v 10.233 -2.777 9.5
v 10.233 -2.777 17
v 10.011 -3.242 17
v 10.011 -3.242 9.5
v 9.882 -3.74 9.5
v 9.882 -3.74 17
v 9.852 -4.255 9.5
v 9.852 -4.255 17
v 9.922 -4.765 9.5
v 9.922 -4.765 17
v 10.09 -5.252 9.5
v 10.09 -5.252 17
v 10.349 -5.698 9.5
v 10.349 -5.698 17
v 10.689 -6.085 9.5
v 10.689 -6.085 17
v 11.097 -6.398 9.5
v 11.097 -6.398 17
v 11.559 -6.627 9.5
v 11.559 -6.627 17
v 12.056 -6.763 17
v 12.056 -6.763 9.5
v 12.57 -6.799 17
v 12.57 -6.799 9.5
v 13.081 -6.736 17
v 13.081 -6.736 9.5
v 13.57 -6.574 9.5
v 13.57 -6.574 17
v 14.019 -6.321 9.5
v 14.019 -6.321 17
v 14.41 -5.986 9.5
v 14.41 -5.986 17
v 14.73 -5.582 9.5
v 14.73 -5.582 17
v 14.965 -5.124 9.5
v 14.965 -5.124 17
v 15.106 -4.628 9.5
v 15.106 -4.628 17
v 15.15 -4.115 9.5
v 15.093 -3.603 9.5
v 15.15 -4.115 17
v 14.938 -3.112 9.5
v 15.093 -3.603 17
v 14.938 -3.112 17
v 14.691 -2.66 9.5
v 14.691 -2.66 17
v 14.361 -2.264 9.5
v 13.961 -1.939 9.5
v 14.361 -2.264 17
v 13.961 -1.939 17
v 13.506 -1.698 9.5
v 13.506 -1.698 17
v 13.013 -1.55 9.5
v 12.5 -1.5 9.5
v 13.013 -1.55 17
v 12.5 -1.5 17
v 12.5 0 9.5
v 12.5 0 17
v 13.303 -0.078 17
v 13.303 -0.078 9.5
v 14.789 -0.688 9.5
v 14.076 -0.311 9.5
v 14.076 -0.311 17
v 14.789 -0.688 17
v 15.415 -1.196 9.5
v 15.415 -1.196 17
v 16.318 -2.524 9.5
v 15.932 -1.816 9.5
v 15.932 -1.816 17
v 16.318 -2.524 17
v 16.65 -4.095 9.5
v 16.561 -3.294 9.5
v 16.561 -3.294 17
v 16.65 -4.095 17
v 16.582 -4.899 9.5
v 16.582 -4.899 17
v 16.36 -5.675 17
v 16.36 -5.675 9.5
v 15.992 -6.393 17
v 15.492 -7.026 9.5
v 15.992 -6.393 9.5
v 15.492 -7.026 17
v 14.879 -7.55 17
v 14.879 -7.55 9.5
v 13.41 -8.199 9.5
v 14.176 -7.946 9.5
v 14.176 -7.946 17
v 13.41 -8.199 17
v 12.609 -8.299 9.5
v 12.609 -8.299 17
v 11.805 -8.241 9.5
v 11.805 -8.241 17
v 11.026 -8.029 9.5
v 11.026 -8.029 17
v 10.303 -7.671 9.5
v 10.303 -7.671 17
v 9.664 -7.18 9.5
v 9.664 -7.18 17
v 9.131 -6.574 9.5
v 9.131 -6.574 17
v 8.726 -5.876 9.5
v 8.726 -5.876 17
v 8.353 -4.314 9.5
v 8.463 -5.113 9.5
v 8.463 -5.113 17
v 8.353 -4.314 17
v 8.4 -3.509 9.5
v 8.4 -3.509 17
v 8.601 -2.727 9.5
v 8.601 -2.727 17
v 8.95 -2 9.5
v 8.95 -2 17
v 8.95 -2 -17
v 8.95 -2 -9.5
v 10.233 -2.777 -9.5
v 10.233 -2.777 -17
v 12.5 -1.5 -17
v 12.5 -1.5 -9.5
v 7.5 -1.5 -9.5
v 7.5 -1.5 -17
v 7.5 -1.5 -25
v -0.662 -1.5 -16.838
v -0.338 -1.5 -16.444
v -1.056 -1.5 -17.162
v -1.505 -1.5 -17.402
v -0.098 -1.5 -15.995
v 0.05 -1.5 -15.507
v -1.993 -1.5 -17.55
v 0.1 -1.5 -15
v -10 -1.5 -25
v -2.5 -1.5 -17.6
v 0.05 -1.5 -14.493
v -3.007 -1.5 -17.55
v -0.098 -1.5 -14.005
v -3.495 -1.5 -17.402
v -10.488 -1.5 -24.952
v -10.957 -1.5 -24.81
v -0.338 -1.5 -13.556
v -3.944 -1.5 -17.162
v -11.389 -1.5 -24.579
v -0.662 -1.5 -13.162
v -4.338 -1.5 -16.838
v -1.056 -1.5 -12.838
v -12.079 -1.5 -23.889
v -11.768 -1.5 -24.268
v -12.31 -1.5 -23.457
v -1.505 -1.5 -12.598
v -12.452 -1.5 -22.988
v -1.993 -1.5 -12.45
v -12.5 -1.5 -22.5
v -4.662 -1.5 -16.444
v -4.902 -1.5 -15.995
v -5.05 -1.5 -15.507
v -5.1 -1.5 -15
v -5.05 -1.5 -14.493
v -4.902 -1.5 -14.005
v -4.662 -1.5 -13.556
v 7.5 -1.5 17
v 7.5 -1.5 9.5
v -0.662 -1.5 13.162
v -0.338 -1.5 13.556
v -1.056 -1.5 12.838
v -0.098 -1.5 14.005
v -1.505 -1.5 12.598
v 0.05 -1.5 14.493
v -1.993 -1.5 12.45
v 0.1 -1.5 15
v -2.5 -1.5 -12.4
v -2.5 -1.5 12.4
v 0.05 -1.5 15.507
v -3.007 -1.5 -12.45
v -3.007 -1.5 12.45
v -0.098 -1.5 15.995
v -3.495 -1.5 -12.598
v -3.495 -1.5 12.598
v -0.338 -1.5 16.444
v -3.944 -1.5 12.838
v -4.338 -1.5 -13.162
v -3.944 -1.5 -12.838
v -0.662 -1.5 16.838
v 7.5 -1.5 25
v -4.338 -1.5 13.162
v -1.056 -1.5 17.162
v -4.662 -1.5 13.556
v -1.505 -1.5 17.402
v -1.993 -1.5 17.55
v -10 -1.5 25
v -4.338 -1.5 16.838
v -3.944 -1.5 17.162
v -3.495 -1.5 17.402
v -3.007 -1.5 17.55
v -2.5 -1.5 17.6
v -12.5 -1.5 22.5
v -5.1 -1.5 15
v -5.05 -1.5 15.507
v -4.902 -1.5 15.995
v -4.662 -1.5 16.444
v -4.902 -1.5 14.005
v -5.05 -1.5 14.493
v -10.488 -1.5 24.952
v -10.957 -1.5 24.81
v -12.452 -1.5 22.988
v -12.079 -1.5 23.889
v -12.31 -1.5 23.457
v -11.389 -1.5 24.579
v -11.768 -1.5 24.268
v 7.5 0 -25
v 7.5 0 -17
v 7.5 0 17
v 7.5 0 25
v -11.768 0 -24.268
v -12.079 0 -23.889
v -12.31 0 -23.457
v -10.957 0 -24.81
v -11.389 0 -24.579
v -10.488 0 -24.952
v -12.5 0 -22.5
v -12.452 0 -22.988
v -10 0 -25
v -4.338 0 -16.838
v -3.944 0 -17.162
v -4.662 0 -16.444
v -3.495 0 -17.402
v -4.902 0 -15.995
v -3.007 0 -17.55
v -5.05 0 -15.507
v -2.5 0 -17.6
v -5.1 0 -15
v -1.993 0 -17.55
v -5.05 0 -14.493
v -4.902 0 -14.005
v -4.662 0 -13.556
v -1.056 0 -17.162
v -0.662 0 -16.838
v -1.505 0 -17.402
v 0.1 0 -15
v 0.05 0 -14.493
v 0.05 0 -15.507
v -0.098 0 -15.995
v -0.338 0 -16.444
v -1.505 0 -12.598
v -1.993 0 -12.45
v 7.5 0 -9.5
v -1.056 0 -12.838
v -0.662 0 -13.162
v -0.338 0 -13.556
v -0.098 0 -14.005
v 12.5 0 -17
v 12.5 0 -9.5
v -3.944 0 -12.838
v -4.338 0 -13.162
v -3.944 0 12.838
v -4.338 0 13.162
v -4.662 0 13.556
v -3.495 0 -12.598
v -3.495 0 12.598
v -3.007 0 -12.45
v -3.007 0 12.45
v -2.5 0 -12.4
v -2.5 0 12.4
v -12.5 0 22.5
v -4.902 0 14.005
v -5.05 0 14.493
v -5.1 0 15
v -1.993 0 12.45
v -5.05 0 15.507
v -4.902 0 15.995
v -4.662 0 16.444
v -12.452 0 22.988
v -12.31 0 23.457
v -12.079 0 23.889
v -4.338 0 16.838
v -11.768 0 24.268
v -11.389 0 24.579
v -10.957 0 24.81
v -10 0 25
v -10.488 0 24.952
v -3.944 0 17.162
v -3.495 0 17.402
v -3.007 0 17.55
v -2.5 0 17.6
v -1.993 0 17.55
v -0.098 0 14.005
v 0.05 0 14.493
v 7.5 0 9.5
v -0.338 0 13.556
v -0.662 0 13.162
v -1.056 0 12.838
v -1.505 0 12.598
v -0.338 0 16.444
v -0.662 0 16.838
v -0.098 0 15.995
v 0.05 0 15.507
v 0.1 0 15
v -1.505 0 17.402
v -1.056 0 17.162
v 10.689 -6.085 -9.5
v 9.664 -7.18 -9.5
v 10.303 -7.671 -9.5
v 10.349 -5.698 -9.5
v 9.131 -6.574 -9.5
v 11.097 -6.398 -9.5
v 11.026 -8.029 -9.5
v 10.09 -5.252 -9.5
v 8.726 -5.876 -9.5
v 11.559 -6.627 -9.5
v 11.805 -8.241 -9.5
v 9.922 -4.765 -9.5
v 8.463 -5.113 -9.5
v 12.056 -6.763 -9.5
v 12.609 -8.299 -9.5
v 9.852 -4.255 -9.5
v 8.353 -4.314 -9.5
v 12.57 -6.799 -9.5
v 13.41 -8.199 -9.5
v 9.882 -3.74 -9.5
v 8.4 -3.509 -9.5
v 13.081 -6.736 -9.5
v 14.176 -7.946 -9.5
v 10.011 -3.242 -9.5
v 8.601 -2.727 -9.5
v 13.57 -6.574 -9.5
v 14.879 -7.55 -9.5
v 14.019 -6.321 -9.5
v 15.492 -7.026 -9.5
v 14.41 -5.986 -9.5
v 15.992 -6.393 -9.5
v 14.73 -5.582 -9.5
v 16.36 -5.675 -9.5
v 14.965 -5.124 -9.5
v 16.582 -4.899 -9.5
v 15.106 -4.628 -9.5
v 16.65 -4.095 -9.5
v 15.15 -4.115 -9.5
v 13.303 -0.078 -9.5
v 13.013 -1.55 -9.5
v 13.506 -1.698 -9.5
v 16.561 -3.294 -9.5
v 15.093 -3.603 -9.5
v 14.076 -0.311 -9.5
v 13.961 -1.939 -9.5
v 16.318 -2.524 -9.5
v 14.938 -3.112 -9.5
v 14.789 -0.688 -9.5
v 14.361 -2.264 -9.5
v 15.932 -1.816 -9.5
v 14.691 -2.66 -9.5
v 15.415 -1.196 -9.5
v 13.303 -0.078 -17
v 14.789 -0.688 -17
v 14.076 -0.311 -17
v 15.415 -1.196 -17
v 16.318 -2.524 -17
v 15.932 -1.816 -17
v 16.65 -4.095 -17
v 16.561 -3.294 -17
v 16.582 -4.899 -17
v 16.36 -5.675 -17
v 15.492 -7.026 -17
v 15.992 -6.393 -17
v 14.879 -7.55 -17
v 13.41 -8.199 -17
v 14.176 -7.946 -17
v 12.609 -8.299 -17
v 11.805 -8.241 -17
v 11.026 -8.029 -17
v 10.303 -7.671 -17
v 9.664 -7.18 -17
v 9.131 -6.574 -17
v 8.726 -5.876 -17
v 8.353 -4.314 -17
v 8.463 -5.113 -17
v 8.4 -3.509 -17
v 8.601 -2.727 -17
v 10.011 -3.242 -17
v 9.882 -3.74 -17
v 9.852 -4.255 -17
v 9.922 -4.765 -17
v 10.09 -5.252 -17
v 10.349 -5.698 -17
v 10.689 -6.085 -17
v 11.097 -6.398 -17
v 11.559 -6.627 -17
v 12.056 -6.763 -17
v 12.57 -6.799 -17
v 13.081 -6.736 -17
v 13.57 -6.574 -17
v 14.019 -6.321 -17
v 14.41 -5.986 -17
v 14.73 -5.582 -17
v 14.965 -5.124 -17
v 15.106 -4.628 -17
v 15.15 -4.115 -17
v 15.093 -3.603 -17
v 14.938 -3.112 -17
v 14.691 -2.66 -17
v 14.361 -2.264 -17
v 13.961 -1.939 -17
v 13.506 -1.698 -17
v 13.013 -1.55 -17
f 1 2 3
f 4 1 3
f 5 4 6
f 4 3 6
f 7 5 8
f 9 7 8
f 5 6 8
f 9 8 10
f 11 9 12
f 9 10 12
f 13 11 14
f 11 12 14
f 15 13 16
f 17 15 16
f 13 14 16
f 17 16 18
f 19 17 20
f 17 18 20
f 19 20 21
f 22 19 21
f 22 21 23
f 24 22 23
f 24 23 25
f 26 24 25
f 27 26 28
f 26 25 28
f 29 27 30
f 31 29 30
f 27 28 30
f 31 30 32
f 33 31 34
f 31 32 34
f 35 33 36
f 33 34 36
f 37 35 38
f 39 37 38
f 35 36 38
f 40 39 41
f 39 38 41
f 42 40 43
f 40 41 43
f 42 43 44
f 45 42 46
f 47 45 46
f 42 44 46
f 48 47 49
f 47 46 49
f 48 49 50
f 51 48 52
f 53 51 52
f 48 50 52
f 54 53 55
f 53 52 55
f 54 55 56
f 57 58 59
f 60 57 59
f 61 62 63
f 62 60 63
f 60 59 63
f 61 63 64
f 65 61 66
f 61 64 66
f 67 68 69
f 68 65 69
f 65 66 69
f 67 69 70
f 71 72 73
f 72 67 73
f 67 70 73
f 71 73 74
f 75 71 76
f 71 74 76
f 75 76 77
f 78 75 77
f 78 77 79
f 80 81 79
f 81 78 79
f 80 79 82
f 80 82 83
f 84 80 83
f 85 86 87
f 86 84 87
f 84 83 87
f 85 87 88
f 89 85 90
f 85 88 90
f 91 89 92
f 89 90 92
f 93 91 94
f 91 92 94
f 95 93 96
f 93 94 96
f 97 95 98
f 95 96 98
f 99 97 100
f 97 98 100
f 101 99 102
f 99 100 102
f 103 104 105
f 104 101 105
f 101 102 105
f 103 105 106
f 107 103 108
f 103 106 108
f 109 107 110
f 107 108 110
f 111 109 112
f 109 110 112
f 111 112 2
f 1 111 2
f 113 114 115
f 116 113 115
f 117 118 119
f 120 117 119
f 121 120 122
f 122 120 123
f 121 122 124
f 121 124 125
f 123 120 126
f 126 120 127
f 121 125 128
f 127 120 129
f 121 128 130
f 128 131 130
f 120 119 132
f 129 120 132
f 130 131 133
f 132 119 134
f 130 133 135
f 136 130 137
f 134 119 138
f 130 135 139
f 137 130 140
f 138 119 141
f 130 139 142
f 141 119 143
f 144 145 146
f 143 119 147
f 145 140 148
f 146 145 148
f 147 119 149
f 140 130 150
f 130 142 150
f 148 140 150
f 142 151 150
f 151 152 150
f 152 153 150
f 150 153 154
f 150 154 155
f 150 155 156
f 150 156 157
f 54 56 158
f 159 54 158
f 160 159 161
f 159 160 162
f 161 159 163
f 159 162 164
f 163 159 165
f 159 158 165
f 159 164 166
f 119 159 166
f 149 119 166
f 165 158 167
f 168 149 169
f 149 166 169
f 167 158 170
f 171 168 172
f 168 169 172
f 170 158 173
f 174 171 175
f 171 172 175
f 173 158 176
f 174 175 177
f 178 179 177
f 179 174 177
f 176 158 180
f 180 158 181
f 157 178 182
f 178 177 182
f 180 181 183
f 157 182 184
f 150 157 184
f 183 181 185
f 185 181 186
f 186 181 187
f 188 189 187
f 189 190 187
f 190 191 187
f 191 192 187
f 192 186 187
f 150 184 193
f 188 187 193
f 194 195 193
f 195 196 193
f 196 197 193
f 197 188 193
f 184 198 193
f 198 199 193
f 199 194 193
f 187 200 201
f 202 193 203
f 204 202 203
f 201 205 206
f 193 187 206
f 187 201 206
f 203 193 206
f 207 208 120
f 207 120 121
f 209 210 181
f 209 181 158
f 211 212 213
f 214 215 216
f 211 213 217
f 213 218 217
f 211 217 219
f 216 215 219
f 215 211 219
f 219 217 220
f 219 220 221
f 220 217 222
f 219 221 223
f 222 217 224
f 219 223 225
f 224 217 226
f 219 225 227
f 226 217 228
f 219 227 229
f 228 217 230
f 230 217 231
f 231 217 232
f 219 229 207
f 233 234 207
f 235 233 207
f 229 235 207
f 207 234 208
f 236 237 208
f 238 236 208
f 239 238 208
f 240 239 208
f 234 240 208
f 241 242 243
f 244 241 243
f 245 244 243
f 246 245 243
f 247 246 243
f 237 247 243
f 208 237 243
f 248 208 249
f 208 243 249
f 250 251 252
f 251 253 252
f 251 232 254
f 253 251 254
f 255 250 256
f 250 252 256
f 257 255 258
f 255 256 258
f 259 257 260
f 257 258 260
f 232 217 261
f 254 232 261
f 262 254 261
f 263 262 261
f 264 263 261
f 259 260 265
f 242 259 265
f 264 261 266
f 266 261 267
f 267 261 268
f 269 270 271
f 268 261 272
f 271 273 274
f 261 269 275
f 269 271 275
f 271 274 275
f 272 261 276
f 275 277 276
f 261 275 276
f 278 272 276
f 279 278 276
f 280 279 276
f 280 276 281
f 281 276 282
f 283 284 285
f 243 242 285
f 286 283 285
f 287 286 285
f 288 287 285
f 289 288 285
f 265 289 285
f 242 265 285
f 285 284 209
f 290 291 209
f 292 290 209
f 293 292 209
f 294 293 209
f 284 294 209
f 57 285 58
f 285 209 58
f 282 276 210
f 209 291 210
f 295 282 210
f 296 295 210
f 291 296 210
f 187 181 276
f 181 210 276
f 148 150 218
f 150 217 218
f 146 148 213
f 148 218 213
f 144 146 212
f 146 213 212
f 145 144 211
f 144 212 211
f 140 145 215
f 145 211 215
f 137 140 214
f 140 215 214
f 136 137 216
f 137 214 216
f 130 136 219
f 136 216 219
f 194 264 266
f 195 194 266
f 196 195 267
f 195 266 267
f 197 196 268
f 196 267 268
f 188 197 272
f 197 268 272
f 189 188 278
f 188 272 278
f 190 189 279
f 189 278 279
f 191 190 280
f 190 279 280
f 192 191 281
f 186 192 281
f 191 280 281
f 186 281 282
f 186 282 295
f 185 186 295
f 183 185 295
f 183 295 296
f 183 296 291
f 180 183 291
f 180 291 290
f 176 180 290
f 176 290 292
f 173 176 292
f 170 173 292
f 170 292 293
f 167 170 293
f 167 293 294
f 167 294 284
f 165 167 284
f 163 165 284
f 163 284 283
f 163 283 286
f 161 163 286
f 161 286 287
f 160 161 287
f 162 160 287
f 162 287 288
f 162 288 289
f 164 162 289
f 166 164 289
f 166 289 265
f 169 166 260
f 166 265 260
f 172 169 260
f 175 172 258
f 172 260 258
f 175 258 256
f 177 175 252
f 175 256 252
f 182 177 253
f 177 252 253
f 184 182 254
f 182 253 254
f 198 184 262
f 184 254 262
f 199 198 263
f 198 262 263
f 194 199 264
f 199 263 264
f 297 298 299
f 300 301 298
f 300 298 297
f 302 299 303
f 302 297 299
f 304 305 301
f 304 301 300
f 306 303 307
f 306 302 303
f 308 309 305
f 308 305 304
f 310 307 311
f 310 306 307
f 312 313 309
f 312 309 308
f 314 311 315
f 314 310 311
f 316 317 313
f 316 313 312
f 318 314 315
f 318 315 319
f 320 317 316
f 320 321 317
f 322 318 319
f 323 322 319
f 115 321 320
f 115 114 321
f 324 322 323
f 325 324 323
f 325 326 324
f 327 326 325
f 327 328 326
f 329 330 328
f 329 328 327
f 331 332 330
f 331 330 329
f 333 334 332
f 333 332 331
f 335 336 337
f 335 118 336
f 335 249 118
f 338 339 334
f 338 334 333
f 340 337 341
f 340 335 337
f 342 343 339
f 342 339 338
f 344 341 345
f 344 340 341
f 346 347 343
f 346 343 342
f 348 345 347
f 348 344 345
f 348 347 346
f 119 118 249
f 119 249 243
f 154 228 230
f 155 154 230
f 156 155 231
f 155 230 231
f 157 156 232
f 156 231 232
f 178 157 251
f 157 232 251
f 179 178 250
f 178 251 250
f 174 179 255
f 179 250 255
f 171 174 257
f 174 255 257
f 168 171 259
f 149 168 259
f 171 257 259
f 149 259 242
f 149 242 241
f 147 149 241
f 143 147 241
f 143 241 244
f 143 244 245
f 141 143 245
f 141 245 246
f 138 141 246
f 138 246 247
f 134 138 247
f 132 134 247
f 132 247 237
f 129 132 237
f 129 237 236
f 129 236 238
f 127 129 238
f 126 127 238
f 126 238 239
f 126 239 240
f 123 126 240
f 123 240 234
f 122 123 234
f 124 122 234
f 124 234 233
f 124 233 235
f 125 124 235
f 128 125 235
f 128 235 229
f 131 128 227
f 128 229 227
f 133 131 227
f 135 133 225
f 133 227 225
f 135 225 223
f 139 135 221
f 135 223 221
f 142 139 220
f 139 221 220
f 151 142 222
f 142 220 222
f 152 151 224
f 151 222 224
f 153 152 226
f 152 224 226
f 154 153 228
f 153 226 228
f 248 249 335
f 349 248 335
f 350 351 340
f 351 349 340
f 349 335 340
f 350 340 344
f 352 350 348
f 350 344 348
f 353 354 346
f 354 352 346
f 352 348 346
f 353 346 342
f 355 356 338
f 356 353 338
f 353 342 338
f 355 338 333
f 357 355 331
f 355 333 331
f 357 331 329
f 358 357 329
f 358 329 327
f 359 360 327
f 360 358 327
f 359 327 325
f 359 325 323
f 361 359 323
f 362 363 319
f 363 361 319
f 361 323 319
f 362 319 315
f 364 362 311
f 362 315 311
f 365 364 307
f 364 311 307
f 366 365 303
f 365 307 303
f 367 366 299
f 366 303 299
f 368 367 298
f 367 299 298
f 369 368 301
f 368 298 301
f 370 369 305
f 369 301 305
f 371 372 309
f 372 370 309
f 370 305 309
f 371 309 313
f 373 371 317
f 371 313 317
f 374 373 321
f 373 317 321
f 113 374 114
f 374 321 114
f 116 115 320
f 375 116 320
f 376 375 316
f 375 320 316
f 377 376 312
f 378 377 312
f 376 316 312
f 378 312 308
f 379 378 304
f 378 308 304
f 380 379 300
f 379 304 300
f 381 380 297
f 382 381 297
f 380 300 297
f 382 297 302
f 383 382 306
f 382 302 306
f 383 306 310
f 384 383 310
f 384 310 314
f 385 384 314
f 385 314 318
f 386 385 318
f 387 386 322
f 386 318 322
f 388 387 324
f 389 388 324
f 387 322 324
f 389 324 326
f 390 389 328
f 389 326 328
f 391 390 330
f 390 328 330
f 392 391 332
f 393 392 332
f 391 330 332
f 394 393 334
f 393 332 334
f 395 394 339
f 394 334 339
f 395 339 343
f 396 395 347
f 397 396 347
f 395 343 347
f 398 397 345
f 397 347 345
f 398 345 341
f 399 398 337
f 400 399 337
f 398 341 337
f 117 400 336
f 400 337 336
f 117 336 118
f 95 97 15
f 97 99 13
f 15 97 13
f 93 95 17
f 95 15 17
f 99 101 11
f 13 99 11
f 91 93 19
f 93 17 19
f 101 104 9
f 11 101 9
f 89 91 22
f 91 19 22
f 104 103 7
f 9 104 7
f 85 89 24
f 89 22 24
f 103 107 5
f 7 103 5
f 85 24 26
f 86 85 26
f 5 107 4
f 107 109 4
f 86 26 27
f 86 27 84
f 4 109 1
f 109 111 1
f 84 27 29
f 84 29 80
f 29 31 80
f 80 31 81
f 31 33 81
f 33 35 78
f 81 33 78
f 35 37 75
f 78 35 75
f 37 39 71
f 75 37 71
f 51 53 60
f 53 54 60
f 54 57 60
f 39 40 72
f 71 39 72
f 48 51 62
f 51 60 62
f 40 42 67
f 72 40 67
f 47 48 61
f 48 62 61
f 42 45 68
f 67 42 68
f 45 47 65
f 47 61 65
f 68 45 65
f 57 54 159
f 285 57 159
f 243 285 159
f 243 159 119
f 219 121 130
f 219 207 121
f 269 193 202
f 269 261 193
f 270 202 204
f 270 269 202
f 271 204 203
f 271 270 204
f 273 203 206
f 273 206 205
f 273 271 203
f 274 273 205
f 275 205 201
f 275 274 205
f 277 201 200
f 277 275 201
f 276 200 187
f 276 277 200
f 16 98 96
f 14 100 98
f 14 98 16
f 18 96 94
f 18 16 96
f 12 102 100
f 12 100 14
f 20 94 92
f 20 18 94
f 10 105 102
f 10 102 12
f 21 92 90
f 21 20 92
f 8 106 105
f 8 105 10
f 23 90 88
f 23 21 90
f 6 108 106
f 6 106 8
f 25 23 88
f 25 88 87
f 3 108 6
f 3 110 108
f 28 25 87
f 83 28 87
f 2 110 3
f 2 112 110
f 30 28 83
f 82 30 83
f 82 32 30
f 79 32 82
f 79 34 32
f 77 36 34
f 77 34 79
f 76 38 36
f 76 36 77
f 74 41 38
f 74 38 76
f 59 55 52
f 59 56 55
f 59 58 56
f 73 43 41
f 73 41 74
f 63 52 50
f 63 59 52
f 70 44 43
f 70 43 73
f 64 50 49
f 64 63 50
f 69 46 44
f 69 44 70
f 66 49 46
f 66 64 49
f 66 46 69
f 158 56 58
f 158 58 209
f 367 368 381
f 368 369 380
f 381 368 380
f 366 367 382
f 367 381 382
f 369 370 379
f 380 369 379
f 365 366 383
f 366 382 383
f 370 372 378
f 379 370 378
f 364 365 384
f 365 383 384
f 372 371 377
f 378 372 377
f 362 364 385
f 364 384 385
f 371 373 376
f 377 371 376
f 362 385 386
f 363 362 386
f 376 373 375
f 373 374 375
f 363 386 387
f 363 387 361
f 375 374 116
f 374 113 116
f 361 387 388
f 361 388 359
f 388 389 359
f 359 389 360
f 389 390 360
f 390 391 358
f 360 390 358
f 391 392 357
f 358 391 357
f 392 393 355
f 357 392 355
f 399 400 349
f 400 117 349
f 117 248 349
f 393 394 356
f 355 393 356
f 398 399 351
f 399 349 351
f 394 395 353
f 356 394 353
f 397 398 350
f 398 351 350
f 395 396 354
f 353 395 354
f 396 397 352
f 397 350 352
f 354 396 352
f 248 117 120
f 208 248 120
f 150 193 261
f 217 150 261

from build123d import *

# Parameters (mm, degrees)
TABAN_FLAN_1_DEPTH    = 25
IZIM9_W               = 9.15
IZIM9_H               = 8
IZIM9_H_2             = 19
KES_EKSTR_ZYON1_DEPTH = 32.162677998
IZIM11_R              = 2.6
KES_EKSTR_ZYON2_DEPTH = 10
RADYUS1_R             = 2.5


# Sheet-metal steps are written as plain solids
with BuildPart() as part:
    # Çizim1 → Taban-Flanş1 (new, symmetric)
    with BuildSketch(Plane.XY):
        with BuildLine():
            Line((-12.5, 0), (12.5, 0))
            ThreePointArc((12.5, 0), (14.537154879, -7.765591238), (8.95035213, -2))
            Line((8.95035213, -2), (10.233357384, -2.777108434))
            ThreePointArc((10.233357384, -2.777108434), (13.800833838, -6.458751031), (12.5, -1.5))
            Line((12.5, -1.5), (-12.5, -1.5))
            Line((-12.5, -1.5), (-12.5, 0))
        make_face()
    extrude(amount=TABAN_FLAN_1_DEPTH, both=True)

    # Çizim9 → Kes-Ekstrüzyon1 (cut, through all)
    with BuildSketch(Plane(origin=(0, 0, 0), x_dir=(1, 0, 0), z_dir=(0, 1, 0))):
        with Locations((12.075, 21)):
            Rectangle(IZIM9_W, IZIM9_H)
        with Locations((12.075, -21)):
            Rectangle(IZIM9_W, IZIM9_H)
        with Locations((12.075, 0)):
            Rectangle(IZIM9_W, IZIM9_H_2)
    extrude(amount=-KES_EKSTR_ZYON1_DEPTH, mode=Mode.SUBTRACT)

    # Çizim11 → Kes-Ekstrüzyon2 (cut)
    with BuildSketch(Plane(origin=(0, 0, 0), x_dir=(1, 0, 0), z_dir=(0, 1, 0))):
        with Locations(Location((-2.5, 15, 0), (0, 0, 180))):
            Circle(IZIM11_R)
        with Locations(Location((-2.5, -15, 0), (0, 0, 180))):
            Circle(IZIM11_R)
    extrude(amount=-KES_EKSTR_ZYON2_DEPTH, mode=Mode.SUBTRACT)

    # Radyus1
    radyus1_edges = [part.edges().sort_by_distance(p)[0] for p in [
        (-12.5, -0.75, 25),
        (-12.5, -0.75, -25),
    ]]
    fillet(radyus1_edges, radius=RADYUS1_R)


solid = part.part
